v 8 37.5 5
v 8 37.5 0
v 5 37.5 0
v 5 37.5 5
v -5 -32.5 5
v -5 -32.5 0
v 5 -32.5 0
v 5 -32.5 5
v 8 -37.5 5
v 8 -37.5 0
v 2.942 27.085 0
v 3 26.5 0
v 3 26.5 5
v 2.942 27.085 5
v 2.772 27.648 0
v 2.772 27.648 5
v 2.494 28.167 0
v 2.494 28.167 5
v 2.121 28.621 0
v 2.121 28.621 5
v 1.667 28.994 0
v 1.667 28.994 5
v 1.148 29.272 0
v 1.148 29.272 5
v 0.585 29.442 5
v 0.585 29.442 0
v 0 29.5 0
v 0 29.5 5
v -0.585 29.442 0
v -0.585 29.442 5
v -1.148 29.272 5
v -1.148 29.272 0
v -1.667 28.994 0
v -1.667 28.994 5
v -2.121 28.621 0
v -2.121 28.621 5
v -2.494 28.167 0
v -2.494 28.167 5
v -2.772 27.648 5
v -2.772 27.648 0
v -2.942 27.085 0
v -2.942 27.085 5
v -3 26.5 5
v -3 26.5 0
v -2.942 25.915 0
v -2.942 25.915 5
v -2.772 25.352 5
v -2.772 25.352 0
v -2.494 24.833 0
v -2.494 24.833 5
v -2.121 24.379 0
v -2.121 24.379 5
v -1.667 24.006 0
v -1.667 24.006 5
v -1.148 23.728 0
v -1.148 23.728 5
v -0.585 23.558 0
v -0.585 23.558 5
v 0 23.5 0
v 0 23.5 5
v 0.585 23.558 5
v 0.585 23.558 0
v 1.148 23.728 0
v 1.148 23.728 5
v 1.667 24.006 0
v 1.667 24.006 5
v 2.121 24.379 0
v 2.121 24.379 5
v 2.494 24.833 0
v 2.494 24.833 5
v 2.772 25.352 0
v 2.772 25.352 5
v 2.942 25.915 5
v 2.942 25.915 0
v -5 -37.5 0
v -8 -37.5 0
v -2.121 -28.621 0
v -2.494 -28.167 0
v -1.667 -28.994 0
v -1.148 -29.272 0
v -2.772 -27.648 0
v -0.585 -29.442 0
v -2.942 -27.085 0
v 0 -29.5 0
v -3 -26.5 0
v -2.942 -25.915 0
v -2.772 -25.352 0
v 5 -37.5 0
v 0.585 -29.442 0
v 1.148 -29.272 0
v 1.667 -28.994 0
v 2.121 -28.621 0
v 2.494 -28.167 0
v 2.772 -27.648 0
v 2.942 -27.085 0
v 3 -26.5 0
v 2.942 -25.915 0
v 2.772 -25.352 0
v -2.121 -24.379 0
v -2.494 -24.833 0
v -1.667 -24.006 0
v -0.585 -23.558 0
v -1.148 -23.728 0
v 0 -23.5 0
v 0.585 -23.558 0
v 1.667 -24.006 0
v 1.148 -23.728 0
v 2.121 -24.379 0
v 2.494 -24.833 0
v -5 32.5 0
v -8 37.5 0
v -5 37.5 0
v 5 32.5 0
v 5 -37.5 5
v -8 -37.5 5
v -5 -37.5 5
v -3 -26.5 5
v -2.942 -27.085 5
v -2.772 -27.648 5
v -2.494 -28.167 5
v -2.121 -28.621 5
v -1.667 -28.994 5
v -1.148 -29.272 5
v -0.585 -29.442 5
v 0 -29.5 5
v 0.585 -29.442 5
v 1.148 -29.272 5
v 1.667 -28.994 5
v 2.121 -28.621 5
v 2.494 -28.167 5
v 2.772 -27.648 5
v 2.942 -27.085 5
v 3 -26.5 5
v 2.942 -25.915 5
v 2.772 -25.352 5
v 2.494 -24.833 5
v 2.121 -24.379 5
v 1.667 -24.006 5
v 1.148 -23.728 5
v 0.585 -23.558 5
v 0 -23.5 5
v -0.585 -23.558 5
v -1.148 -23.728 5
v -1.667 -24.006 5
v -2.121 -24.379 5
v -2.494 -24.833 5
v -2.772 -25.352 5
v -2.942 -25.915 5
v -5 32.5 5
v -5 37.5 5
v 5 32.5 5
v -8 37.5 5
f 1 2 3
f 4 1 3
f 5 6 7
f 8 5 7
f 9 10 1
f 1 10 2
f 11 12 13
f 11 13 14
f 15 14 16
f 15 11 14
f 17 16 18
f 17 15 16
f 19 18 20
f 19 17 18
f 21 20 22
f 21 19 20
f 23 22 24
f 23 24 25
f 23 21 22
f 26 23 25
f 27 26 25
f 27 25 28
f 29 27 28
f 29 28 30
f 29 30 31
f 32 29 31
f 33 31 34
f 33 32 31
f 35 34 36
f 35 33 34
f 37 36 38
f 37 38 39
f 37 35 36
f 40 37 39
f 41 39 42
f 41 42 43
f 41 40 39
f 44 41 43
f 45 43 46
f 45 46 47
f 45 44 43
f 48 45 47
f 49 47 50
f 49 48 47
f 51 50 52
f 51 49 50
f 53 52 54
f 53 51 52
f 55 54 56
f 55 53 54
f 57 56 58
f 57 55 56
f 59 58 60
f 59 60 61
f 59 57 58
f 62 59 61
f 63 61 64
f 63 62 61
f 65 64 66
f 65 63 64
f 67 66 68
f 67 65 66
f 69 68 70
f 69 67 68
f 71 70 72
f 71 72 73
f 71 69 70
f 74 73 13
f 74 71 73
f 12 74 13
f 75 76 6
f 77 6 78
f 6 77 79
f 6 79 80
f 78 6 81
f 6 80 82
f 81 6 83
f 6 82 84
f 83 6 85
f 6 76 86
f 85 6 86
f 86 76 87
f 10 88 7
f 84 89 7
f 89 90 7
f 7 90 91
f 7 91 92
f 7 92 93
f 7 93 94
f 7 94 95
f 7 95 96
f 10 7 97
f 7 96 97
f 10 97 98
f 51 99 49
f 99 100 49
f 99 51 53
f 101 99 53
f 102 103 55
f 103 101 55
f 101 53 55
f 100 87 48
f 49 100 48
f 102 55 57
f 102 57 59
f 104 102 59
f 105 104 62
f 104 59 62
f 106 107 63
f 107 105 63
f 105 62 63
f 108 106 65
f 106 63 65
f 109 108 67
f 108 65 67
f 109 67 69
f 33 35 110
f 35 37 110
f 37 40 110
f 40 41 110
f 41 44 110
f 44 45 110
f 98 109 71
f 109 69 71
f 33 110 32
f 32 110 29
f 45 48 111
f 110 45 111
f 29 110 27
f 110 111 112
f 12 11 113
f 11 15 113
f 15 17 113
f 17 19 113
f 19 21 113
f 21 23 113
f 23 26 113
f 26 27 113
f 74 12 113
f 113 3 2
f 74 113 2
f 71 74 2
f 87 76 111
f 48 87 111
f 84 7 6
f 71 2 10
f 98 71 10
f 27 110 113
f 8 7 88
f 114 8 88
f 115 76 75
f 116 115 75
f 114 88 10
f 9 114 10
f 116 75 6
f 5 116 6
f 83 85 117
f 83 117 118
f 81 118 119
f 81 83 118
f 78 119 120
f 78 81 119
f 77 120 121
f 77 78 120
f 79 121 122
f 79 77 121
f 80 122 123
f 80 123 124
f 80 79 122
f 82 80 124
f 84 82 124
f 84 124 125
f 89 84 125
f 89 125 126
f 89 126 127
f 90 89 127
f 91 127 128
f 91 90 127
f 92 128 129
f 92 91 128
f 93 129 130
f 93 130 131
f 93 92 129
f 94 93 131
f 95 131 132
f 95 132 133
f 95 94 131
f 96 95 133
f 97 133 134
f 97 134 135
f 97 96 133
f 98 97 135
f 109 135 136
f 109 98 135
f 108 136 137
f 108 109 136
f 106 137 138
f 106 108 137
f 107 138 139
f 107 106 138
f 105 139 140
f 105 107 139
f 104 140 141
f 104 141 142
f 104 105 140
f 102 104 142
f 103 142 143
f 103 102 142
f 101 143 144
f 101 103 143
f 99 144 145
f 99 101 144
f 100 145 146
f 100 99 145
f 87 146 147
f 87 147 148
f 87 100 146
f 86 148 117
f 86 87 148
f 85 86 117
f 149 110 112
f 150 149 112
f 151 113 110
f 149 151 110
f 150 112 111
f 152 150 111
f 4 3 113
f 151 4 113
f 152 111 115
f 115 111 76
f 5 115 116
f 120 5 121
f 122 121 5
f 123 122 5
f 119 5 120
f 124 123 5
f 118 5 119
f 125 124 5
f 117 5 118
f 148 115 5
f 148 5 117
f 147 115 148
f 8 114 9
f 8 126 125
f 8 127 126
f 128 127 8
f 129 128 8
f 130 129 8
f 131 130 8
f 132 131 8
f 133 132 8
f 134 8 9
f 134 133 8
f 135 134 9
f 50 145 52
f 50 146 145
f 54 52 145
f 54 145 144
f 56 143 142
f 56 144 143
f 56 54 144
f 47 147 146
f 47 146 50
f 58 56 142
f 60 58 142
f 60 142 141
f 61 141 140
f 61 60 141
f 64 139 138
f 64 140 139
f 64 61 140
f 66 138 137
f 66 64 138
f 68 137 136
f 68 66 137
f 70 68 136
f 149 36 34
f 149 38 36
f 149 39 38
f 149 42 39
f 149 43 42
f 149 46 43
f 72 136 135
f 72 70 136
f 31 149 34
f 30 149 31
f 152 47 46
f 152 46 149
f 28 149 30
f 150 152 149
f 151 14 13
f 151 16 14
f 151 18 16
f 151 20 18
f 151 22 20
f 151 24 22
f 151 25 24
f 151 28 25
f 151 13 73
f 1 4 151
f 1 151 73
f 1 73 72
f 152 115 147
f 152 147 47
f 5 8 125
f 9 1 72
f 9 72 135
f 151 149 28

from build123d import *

# Parameters (mm, degrees)
SKETCH2_R           = 3
BOSS_EXTRUDE1_DEPTH = 5


with BuildPart() as part:
    # Sketch2 → Boss-Extrude1 (new body)
    with BuildSketch(Plane.XY):
        Polygon((-5, 37.5), (-8, 37.5), (-8, -37.5), (-5, -37.5), (-5, -32.5), (5, -32.5), (5, -37.5), (8, -37.5), (8, 37.5), (5, 37.5), (5, 32.5), (-5, 32.5), align=None)
        with Locations((0, -26.5)):
            Circle(SKETCH2_R, mode=Mode.SUBTRACT)
        with Locations((0, 26.5)):
            Circle(SKETCH2_R, mode=Mode.SUBTRACT)
    extrude(amount=BOSS_EXTRUDE1_DEPTH)


solid = part.part
